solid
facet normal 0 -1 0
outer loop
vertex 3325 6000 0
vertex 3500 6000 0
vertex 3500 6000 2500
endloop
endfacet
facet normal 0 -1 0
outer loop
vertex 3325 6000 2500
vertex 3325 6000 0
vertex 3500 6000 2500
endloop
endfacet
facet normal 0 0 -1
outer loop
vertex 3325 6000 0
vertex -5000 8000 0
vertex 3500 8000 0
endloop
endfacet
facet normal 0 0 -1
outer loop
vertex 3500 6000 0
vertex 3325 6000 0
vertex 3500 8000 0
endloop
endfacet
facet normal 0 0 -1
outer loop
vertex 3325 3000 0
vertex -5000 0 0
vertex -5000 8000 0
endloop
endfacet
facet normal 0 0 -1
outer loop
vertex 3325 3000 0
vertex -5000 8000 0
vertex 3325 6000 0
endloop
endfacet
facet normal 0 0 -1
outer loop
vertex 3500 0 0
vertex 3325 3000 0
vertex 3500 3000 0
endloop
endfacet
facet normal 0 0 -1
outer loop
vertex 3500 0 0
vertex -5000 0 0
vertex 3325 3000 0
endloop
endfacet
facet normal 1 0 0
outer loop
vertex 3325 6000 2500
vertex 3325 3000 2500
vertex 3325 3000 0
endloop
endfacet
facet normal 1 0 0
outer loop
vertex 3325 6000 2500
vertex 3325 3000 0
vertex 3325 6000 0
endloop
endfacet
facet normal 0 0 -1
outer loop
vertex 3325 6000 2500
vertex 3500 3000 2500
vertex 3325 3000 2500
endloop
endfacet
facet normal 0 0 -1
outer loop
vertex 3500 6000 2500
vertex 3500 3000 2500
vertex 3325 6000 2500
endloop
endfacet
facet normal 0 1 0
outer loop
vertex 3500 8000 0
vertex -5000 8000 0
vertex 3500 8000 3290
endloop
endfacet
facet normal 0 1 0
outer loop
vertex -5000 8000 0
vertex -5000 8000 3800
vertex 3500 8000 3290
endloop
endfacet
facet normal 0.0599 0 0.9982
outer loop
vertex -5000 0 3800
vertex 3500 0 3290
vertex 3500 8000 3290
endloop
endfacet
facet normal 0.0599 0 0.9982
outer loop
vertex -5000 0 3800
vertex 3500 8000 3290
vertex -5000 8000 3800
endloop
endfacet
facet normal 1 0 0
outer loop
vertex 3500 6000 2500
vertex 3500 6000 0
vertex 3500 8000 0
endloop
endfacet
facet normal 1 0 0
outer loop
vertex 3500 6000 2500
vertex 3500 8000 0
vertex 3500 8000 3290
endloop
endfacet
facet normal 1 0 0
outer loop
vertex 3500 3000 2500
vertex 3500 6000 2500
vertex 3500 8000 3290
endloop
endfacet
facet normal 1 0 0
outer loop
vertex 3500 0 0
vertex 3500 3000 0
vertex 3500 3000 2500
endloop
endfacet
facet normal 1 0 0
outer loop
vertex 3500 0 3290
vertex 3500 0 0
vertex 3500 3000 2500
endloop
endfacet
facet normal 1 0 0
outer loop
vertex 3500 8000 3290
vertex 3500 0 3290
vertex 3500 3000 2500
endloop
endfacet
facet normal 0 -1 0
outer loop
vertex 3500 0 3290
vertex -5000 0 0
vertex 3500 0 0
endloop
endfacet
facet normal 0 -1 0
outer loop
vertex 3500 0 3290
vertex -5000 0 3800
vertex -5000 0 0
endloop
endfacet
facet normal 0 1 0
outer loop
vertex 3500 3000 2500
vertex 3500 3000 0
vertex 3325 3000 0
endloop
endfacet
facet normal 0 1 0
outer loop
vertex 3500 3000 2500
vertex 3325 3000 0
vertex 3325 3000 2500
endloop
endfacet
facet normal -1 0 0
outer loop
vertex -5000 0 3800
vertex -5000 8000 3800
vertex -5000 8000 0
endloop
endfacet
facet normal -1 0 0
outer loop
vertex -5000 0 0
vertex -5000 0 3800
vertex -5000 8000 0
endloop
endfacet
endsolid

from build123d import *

# Parameters (mm, degrees)
F0_W     = 5000
F0_H     = 3500
F1_DEPTH = 8000
F3_W     = 3000
F3_H     = 2500
F4_DEPTH = 200


with BuildPart() as f1:
    # F0 (on Front) → F1 (new body)
    with BuildSketch(Plane.XZ):
        with Locations((-2500, 1750)):
            Rectangle(F0_W, F0_H)
        Polygon((0, 3500), (0, 0), (3500, 0), (3500, 3290), align=None)
        Polygon((-5000, 3500), (0, 3500), (-5000, 3800), align=None)
    extrude(amount=-F1_DEPTH)

    # F3 (on offset) → F4 (cut)
    with BuildSketch(Plane.YZ.offset(3525)):
        with Locations((4500, 1250)):
            Rectangle(F3_W, F3_H)
    extrude(amount=-F4_DEPTH, mode=Mode.SUBTRACT)


solid = f1.part
